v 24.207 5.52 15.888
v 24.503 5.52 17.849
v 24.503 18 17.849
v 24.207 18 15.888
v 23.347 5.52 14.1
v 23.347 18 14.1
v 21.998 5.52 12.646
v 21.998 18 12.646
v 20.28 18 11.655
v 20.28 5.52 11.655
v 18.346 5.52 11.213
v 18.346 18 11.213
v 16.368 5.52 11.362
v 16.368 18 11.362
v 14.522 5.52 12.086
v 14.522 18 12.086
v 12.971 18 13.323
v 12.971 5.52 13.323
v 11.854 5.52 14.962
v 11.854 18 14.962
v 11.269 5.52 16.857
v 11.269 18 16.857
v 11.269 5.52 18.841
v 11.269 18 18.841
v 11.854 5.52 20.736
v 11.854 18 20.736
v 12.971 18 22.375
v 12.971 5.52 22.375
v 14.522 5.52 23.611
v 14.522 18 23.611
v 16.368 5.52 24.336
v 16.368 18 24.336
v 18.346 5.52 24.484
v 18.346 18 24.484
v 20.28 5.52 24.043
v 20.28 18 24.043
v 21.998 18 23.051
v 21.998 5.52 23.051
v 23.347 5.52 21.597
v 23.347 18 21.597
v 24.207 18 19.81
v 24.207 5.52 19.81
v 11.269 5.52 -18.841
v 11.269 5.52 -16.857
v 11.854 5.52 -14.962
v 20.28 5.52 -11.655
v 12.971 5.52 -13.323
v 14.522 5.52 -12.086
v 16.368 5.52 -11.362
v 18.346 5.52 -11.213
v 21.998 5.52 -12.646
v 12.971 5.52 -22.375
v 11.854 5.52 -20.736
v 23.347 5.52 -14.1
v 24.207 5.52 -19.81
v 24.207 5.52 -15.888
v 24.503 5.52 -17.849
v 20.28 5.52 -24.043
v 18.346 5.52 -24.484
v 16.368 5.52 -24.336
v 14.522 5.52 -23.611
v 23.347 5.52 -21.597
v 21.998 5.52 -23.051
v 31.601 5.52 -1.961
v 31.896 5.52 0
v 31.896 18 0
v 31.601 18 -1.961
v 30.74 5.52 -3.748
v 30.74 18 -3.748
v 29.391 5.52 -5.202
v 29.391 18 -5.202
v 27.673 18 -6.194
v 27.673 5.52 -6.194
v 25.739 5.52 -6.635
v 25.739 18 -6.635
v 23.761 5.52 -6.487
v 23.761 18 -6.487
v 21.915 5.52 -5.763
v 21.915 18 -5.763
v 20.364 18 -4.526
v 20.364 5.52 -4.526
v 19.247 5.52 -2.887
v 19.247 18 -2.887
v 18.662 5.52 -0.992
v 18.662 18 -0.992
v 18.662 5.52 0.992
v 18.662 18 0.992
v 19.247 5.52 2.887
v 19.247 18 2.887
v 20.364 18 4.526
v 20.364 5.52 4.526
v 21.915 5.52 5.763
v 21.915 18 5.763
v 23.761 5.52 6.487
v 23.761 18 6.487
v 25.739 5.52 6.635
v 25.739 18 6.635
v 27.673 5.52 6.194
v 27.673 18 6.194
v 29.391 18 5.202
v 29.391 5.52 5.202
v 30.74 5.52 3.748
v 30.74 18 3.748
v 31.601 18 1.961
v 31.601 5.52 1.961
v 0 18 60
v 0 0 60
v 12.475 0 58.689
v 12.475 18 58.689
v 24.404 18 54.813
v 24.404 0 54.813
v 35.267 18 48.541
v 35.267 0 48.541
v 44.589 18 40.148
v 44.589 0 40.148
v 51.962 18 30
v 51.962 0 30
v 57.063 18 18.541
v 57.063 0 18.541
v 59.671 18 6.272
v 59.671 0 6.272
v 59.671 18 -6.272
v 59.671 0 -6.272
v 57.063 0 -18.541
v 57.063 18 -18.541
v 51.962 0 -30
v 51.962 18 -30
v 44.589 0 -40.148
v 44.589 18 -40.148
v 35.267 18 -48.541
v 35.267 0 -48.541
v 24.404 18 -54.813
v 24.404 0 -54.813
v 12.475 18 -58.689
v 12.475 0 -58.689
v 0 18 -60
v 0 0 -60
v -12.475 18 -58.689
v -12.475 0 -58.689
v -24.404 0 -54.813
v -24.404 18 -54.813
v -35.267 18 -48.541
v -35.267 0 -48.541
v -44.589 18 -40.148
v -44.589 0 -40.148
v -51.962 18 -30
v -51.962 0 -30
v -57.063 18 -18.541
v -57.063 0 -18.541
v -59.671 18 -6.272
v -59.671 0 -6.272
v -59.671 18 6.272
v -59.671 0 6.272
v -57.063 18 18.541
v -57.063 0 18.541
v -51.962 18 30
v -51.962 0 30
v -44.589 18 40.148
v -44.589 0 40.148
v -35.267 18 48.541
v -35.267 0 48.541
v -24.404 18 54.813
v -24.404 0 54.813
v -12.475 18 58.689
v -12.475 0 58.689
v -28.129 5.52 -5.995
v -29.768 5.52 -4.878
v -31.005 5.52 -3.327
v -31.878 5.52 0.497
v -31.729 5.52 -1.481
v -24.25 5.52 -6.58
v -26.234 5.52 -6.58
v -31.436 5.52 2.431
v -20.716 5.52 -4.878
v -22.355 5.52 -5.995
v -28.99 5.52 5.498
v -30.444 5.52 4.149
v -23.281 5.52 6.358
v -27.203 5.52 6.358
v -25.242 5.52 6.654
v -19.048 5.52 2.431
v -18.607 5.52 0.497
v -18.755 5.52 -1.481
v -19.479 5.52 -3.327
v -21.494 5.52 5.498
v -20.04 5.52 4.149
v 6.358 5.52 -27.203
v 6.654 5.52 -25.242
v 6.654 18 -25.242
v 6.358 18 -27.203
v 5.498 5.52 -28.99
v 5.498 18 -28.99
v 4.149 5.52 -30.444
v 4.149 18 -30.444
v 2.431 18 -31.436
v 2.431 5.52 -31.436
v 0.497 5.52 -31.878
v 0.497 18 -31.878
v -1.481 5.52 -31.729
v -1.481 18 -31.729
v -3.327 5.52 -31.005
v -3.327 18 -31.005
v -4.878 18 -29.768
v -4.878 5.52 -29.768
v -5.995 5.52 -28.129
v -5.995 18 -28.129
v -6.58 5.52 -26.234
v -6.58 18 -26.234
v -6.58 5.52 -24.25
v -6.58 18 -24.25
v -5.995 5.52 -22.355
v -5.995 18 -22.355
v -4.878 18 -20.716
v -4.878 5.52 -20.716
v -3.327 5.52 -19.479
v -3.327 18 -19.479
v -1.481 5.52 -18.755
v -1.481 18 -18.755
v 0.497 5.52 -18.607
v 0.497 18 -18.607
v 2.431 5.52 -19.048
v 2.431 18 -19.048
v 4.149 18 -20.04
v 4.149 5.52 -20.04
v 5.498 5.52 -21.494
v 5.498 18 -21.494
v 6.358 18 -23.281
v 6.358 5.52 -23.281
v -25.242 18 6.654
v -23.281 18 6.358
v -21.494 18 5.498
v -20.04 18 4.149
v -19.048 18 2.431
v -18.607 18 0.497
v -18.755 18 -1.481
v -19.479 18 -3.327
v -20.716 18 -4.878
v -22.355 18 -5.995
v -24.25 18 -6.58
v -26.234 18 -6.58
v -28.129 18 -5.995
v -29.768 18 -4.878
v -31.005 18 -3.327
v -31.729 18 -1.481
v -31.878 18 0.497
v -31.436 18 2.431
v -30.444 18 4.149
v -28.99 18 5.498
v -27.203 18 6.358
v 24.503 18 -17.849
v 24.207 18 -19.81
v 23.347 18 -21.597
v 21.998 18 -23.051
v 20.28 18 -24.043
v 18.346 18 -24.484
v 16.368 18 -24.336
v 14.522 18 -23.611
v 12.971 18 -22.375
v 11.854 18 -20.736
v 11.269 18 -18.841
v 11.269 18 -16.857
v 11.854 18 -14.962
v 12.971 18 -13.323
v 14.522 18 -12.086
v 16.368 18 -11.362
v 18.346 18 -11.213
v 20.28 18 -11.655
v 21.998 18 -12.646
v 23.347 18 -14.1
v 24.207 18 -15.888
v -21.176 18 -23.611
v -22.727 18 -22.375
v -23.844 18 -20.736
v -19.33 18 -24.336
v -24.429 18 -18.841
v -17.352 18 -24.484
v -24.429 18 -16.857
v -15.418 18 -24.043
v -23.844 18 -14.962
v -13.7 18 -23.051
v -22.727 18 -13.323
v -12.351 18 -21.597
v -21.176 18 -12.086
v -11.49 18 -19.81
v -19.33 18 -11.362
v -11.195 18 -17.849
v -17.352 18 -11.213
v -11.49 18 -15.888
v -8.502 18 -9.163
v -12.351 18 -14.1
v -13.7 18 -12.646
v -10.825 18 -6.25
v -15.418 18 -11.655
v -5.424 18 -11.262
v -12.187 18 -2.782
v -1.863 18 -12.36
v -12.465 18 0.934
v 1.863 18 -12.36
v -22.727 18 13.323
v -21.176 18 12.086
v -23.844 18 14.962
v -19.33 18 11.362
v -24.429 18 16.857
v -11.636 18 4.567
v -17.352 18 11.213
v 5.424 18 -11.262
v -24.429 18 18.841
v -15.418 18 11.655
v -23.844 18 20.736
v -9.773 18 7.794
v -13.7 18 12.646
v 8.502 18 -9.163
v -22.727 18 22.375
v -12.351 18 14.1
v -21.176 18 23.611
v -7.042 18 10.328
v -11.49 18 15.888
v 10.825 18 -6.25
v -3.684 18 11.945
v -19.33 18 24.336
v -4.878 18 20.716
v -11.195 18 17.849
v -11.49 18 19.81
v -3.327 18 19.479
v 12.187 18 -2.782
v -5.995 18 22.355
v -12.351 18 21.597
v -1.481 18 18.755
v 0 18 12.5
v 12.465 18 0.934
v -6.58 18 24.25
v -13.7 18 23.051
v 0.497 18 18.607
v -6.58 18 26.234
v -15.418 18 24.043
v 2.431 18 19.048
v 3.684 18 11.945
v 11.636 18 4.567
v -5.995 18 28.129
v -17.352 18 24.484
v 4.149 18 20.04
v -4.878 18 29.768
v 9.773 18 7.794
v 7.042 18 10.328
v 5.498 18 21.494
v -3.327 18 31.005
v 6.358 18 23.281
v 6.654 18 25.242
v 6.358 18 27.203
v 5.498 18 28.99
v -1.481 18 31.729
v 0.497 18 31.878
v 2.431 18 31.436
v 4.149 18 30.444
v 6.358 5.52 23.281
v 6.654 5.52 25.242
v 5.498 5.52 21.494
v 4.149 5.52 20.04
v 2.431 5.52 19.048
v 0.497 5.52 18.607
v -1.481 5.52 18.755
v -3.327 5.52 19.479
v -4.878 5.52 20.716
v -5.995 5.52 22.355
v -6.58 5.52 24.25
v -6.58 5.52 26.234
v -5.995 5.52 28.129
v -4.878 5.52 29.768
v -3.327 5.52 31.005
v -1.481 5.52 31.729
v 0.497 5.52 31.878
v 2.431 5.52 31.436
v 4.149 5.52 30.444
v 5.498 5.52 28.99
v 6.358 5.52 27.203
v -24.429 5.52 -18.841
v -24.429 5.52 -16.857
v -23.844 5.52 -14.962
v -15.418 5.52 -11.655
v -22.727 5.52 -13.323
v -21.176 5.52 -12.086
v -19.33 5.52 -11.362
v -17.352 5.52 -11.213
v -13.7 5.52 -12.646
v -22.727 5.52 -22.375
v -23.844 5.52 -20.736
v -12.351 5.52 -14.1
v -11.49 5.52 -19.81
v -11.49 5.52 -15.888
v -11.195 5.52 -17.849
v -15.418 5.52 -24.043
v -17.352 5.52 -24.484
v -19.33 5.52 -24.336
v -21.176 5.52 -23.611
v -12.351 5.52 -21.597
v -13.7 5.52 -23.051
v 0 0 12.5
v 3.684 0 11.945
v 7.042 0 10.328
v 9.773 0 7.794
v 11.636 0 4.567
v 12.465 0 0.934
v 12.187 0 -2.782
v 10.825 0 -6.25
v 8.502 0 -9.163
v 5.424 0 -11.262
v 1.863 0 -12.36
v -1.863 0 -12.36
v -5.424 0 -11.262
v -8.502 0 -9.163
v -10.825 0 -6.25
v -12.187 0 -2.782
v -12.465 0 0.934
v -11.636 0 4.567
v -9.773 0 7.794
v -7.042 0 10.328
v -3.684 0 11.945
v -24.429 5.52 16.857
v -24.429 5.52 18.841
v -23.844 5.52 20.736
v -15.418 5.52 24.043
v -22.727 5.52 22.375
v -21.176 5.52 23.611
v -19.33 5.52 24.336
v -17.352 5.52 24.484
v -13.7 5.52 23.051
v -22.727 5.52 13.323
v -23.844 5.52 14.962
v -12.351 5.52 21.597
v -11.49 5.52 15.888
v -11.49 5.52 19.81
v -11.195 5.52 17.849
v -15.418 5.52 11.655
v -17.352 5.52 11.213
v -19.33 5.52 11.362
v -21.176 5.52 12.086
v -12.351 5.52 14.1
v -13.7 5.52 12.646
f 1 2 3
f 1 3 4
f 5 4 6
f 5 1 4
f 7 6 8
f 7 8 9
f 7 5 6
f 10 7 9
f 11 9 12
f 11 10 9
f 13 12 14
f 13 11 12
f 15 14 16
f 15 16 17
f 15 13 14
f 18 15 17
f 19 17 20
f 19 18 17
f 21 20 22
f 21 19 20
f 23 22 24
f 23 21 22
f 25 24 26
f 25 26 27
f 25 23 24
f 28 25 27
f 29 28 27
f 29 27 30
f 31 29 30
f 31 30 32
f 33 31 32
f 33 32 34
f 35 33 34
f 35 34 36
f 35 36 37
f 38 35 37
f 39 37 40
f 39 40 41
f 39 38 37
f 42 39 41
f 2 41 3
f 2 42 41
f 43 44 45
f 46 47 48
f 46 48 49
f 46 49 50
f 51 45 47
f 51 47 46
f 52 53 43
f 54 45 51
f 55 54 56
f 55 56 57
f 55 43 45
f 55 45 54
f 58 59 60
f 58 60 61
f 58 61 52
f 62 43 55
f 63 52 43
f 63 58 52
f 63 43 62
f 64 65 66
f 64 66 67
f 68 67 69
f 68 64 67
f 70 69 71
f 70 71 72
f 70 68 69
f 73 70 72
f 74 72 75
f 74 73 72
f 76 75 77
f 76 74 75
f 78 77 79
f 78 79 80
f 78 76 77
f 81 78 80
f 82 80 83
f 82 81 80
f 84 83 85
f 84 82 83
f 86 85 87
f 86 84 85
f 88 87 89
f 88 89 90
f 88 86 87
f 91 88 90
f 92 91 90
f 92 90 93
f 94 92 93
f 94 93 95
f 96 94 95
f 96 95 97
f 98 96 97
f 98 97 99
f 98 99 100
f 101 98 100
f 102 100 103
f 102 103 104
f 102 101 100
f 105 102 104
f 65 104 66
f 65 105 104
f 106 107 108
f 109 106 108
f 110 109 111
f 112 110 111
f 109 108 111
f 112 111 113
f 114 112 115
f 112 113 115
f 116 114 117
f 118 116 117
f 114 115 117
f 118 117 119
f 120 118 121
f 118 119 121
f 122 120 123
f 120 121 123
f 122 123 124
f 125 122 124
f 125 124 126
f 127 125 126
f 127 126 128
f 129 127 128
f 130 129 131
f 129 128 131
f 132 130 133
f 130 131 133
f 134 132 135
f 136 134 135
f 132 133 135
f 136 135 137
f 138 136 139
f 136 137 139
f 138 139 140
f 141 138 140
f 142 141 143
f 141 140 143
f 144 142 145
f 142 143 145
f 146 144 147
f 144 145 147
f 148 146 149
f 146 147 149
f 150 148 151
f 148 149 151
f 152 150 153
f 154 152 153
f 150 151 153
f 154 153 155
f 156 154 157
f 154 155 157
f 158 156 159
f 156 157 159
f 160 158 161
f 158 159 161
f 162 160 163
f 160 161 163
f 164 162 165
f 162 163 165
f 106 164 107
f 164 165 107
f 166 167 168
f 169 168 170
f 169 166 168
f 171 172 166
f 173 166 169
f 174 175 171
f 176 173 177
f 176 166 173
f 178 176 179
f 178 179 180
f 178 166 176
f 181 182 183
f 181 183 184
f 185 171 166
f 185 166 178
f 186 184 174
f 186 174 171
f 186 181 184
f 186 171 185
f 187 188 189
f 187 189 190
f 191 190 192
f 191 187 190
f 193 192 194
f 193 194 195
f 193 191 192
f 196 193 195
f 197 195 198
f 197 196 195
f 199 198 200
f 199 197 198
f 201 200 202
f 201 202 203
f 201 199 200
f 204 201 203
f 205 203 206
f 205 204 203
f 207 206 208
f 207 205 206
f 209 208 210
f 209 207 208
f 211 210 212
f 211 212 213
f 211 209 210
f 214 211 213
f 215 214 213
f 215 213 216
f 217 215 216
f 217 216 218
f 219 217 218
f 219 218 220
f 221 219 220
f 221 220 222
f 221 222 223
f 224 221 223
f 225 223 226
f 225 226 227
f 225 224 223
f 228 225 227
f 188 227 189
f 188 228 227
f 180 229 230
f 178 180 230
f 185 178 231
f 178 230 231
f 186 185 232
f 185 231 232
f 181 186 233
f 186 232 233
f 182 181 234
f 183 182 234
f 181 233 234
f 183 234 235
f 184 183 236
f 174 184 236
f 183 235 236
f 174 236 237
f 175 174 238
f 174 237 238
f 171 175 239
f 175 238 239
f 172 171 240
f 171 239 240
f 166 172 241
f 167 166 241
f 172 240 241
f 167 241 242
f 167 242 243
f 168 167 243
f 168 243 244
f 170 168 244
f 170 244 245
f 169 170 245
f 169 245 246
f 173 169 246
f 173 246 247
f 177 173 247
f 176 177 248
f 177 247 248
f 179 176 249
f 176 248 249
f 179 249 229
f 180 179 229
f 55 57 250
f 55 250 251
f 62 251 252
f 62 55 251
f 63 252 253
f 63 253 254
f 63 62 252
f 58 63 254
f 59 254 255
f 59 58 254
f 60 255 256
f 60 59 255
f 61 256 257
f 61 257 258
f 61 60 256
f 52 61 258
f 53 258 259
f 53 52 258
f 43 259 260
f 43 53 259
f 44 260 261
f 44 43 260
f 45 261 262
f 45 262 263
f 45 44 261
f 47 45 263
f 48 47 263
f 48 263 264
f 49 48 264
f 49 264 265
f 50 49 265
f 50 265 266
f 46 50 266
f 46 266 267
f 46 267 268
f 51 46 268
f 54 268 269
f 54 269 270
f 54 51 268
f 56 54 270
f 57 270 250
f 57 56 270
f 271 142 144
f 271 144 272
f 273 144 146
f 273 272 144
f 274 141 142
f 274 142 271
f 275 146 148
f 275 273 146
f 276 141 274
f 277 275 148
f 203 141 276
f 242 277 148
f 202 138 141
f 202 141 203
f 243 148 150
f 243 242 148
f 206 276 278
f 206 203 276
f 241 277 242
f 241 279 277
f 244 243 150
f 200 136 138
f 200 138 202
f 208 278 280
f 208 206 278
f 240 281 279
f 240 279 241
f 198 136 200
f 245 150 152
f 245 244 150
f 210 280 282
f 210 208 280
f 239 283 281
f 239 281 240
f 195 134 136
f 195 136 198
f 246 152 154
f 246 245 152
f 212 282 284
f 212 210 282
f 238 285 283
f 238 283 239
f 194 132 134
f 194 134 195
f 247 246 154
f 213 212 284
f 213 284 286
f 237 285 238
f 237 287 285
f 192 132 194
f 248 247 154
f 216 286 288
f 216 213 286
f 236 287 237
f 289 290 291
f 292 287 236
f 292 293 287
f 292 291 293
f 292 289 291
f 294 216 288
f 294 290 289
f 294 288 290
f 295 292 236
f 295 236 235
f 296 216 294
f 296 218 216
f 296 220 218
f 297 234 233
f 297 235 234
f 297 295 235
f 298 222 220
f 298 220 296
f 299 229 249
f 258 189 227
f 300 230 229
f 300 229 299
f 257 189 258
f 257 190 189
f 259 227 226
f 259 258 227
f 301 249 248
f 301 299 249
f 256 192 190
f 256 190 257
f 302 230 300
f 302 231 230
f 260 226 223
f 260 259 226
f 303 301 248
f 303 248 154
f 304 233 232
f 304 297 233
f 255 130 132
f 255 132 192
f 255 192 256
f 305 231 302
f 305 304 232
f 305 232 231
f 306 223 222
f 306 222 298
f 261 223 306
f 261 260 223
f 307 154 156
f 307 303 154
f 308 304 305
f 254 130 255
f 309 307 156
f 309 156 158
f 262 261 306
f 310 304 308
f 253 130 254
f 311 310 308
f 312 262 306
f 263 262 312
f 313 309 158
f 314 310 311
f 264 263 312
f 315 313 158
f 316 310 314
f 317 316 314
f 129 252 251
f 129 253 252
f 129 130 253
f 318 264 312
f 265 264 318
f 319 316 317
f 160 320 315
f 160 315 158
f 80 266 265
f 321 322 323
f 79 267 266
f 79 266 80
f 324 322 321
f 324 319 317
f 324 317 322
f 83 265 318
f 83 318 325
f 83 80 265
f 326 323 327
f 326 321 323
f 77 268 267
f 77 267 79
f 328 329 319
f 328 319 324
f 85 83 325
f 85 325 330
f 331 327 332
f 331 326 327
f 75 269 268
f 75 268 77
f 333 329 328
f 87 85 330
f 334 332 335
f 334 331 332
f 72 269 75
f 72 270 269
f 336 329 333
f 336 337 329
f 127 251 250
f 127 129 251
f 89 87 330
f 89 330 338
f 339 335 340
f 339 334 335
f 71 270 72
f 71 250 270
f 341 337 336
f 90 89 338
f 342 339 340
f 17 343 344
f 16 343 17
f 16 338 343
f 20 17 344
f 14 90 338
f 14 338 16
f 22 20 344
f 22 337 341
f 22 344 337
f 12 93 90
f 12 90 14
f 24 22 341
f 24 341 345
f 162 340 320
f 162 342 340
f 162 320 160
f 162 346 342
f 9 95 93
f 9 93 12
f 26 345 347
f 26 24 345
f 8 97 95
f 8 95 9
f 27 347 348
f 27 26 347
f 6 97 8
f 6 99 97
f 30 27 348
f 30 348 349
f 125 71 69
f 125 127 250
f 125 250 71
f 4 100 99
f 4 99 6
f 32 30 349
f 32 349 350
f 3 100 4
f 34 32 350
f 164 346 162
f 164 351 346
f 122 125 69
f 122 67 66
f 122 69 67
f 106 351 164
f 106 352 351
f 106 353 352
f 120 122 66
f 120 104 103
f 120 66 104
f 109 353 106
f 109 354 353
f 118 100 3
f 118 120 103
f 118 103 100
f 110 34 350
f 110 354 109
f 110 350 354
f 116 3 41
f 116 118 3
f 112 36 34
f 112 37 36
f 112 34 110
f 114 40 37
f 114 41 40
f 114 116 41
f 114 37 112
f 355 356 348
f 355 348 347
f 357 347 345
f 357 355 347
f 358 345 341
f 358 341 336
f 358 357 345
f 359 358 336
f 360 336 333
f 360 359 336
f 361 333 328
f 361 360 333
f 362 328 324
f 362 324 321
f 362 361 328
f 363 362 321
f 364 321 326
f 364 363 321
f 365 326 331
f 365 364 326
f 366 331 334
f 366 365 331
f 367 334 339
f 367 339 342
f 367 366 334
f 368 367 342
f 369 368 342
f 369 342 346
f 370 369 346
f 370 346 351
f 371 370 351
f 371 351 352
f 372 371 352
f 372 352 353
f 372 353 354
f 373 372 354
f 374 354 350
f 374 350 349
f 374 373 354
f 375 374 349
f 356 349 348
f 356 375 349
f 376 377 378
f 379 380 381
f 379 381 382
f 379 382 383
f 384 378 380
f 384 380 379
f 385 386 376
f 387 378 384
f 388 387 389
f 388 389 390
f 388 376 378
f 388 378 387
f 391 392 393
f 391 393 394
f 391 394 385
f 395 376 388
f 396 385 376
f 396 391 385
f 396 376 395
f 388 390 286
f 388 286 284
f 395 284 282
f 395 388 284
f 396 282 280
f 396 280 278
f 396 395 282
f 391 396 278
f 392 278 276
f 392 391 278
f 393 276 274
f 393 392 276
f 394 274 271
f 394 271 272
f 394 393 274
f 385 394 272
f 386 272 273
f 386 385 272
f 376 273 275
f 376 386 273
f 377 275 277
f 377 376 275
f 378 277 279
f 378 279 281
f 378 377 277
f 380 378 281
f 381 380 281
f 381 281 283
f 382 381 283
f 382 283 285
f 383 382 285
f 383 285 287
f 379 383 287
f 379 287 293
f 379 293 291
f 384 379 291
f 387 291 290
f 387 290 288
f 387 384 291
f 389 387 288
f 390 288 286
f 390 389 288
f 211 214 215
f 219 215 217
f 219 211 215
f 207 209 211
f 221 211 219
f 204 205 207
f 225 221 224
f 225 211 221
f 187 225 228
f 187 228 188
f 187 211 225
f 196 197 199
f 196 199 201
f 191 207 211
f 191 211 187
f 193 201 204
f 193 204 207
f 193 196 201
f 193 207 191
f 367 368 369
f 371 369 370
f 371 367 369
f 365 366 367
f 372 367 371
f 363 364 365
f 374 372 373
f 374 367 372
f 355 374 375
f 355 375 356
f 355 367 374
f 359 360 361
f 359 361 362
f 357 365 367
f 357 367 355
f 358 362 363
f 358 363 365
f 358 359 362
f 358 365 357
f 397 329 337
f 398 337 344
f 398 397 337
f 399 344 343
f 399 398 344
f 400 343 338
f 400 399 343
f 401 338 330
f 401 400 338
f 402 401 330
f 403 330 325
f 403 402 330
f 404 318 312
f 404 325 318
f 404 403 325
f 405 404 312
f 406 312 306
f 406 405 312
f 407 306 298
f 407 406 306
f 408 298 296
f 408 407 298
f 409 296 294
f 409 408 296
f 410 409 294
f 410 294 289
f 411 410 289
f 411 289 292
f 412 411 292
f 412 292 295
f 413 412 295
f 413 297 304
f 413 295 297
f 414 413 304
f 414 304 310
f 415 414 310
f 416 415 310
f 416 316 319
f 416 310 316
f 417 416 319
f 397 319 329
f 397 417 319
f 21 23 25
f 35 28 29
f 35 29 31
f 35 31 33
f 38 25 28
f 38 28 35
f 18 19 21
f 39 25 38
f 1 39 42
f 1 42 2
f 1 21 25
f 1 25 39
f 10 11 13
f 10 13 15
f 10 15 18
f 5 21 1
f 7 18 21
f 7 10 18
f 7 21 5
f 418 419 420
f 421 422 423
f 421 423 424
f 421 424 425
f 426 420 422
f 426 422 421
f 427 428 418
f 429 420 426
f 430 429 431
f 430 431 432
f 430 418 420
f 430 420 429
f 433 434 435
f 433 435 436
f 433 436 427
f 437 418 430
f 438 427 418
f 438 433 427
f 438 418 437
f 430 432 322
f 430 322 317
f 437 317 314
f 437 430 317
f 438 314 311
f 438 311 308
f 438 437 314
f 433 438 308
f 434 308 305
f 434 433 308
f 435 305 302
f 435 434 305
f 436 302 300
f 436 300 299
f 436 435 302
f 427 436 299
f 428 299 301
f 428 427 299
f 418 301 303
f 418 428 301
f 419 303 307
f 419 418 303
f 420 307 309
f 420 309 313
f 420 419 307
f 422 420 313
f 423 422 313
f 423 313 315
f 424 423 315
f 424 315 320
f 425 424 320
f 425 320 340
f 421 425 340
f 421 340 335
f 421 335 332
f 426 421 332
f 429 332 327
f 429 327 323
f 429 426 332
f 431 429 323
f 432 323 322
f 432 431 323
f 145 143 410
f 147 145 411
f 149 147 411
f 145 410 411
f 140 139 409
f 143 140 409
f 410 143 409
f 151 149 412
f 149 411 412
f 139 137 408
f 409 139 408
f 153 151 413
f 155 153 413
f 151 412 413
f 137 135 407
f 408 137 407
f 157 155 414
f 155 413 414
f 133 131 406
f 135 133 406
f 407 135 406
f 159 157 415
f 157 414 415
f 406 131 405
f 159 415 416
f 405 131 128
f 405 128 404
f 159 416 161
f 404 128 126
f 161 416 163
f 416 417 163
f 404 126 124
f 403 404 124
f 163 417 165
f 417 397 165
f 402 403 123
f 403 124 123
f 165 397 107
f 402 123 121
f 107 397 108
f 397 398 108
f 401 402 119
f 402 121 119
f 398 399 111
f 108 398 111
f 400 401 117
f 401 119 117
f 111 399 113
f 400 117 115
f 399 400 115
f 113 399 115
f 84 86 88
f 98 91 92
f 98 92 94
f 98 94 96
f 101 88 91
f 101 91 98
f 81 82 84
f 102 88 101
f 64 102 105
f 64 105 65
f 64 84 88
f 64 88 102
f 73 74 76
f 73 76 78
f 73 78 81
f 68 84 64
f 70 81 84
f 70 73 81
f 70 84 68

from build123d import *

# Parameters (mm, degrees)
SKETCH1_R           = 60
BOSS_EXTRUDE1_DEPTH = 18
SKETCH2_R           = 12.5
CUT_EXTRUDE1_DEPTH  = 87.740993769
SKETCH3_R           = 6.654092803
CUT_EXTRUDE2_DEPTH  = 12.480180751
CIRPATTERN1_COUNT   = 8


with BuildPart() as part:
    # Sketch1 → Boss-Extrude1 (new body)
    with BuildSketch(Plane(origin=(0, 0, 0), x_dir=(1, 0, 0), z_dir=(0, 1, 0))):
        Circle(SKETCH1_R)
    extrude(amount=BOSS_EXTRUDE1_DEPTH)

    # Sketch2 → Cut-Extrude1 (cut, through all)
    with BuildSketch(Plane(origin=(0, 0, 0), x_dir=(1, 0, 0), z_dir=(0, 1, 0))):
        Circle(SKETCH2_R)
    extrude(amount=CUT_EXTRUDE1_DEPTH, mode=Mode.SUBTRACT)

    # Sketch3 → Cut-Extrude2 (cut)
    with BuildSketch(Plane(origin=(0, 18, 0), x_dir=(1, 0, 0), z_dir=(0, 1, 0))):
        with Locations((-25.242105276, 0)):
            Circle(SKETCH3_R)
    cut_extrude2 = extrude(amount=-CUT_EXTRUDE2_DEPTH, mode=Mode.SUBTRACT)

    # CirPattern1: Cut-Extrude2 ×8 about axis
    cirpattern1_axis = Axis((0, 0, 0), (0, 1, 0))
    for i in range(1, CIRPATTERN1_COUNT):
        add(cut_extrude2.rotate(cirpattern1_axis, i * 360 / CIRPATTERN1_COUNT), mode=Mode.SUBTRACT)


solid = part.part
